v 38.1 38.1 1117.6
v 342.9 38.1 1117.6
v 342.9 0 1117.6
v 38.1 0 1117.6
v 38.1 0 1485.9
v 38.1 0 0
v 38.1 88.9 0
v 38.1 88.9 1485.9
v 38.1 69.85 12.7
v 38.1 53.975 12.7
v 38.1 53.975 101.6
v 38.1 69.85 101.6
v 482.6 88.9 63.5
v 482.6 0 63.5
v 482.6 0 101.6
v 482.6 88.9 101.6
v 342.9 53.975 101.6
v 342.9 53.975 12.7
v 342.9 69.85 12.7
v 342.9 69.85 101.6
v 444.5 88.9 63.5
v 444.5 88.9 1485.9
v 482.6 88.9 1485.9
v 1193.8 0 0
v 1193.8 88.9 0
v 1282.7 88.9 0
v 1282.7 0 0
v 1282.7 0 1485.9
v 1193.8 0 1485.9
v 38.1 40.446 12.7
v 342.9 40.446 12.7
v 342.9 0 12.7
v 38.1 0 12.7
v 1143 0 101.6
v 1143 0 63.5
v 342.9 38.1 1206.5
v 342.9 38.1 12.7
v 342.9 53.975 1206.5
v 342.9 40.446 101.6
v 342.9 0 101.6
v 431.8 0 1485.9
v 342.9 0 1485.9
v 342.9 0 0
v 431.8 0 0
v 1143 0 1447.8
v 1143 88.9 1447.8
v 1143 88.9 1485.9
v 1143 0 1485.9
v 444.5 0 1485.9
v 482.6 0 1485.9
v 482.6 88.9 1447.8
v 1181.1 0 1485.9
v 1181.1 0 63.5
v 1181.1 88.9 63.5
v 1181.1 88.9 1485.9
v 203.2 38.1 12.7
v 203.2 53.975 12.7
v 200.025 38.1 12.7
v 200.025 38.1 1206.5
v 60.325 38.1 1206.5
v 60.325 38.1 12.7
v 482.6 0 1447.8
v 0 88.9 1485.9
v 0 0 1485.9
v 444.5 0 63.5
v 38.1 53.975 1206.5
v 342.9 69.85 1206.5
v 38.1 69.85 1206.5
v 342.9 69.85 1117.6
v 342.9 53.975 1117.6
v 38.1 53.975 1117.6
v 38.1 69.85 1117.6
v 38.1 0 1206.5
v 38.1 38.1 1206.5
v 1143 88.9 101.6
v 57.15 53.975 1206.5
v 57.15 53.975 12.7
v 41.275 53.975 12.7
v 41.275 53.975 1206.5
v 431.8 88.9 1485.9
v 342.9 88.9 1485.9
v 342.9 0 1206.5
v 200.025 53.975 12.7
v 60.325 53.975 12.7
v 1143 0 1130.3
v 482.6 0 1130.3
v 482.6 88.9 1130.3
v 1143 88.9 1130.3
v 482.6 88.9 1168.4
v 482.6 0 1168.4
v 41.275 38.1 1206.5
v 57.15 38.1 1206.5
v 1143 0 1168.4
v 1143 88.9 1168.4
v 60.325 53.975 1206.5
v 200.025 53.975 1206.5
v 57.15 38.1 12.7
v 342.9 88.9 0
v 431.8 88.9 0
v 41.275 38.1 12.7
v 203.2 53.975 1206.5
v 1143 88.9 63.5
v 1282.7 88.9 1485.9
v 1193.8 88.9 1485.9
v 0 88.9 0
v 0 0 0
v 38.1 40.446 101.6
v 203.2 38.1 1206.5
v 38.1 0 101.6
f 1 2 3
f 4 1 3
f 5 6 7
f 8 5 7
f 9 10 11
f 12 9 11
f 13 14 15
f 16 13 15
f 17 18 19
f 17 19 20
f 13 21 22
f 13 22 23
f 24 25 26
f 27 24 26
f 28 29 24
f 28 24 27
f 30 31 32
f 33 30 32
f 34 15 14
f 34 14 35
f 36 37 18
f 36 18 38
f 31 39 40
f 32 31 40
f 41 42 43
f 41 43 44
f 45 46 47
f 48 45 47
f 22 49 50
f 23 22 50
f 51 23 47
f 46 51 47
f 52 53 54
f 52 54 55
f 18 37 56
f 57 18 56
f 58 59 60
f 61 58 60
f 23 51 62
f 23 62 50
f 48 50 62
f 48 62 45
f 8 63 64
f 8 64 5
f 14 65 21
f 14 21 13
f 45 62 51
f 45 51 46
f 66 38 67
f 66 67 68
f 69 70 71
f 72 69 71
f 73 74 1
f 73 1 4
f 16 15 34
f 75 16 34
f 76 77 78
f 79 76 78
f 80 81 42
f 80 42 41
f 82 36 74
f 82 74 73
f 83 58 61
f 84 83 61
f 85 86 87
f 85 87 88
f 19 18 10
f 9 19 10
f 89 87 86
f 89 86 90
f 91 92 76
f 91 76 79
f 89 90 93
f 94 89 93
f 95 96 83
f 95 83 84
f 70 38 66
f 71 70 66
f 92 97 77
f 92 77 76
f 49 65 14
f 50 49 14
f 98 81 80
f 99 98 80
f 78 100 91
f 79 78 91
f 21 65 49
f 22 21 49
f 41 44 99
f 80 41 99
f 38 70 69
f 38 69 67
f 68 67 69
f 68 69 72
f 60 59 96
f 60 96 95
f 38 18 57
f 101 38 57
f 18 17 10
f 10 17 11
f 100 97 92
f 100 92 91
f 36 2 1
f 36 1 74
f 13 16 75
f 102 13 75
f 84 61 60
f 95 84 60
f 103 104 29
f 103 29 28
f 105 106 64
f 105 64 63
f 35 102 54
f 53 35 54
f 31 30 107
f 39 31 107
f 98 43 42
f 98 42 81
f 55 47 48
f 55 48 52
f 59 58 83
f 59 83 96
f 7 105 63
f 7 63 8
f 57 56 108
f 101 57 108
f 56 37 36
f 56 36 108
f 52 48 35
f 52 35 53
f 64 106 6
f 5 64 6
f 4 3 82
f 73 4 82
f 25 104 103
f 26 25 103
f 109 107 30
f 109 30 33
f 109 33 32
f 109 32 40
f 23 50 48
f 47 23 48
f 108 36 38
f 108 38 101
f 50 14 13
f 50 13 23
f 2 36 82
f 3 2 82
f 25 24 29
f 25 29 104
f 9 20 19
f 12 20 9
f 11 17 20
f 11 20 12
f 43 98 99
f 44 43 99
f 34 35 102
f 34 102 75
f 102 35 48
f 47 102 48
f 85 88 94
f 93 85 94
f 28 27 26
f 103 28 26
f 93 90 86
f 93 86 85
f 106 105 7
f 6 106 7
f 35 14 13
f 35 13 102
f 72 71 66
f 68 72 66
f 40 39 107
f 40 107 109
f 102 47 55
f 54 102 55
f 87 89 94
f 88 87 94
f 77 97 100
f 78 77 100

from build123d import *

# Parameters (mm, degrees)
F0_W      = 88.9
F0_H      = 88.9
F1_DEPTH  = 1485.9
F0_W_2    = 38.1
F2_W      = 38.1
F2_H      = 88.9
F3_DEPTH  = 304.8
F2_W_2    = 40.4457002878
F4_W      = 139.7
F4_H      = 1193.8
F5_DEPTH  = 15.875
F4_W_2    = 15.875
F6_W      = 304.8
F6_H      = 88.9
F7_DEPTH  = 15.875
F8_W      = 38.1
F8_H      = 1422.4
F9_DEPTH  = 88.9
F10_W     = 660.4
F10_H     = 38.1
F11_DEPTH = 88.9
F12_W     = 38.1
F12_H     = 38.1
F12_W_2   = 88.9
F13_DEPTH = 88.9


with BuildPart() as f1:
    # F0 (on Top) → F1 (new body)
    with BuildSketch(Plane.XY):
        with Locations((1238.25, 44.45)):
            Rectangle(F0_W, F0_H)
    extrude(amount=F1_DEPTH)

    # F12 (on face) → F13 (cut)
    with BuildSketch(Plane.XZ):
        with Locations((19.05, 1466.85)):
            Rectangle(F12_W, F12_H)
        with Locations((387.35, 1466.85)):
            Rectangle(F12_W_2, F12_H)
    extrude(amount=F13_DEPTH, mode=Mode.SUBTRACT)


with BuildPart() as f1b:
    # F0 (on Top) → F1, piece 2 (new body)
    with BuildSketch(Plane.XY):
        with Locations((387.35, 44.45)):
            Rectangle(F0_W, F0_H)
    extrude(amount=F1_DEPTH)


with BuildPart() as f1c:
    # F0 (on Top) → F1, piece 3 (new body)
    with BuildSketch(Plane.XY):
        with Locations((19.05, 44.45)):
            Rectangle(F0_W_2, F0_H)
    extrude(amount=F1_DEPTH)


with BuildPart() as f3:
    # F2 (on face) → F3 (new body, through all)
    with BuildSketch(Plane(origin=(342.9, 0, 0), x_dir=(0, -1, 0), z_dir=(-1, 0, 0))):
        with Locations((-19.05, 1162.05)):
            Rectangle(F2_W, F2_H)
    extrude(amount=F3_DEPTH)


with BuildPart() as f3b:
    # F2 (on face) → F3, piece 2 (new body, through all)
    with BuildSketch(Plane(origin=(342.9, 0, 0), x_dir=(0, -1, 0), z_dir=(-1, 0, 0))):
        with Locations((-20.2228501439, 57.15)):
            Rectangle(F2_W_2, F2_H)
    extrude(amount=F3_DEPTH)


with BuildPart() as f5:
    # F4 (on face) → F5 (new body)
    with BuildSketch(Plane(origin=(0, 38.1, 0), x_dir=(-1, 0, 0), z_dir=(0, 1, 0))):
        with Locations((-273.05, 609.6)):
            Rectangle(F4_W, F4_H)
    extrude(amount=F5_DEPTH)


with BuildPart() as f5b:
    # F4 (on face) → F5, piece 2 (new body)
    with BuildSketch(Plane(origin=(0, 38.1, 0), x_dir=(-1, 0, 0), z_dir=(0, 1, 0))):
        with Locations((-130.175, 609.6)):
            Rectangle(F4_W, F4_H)
    extrude(amount=F5_DEPTH)


with BuildPart() as f5c:
    # F4 (on face) → F5, piece 3 (new body)
    with BuildSketch(Plane(origin=(0, 38.1, 0), x_dir=(-1, 0, 0), z_dir=(0, 1, 0))):
        with Locations((-49.2125, 609.6)):
            Rectangle(F4_W_2, F4_H)
    extrude(amount=F5_DEPTH)


with BuildPart() as f7:
    # F6 (on face) → F7 (new body)
    with BuildSketch(Plane(origin=(0, 53.975, 0), x_dir=(-1, 0, 0), z_dir=(0, 1, 0))):
        with Locations((-190.5, 1162.05)):
            Rectangle(F6_W, F6_H)
    extrude(amount=F7_DEPTH)


with BuildPart() as f7b:
    # F6 (on face) → F7, piece 2 (new body)
    with BuildSketch(Plane(origin=(0, 53.975, 0), x_dir=(-1, 0, 0), z_dir=(0, 1, 0))):
        with Locations((-190.5, 57.15)):
            Rectangle(F6_W, F6_H)
    extrude(amount=F7_DEPTH)


with BuildPart() as f9:
    # F8 (on face) → F9 (new body)
    with BuildSketch(Plane.XZ):
        with Locations((1162.05, 774.7)):
            Rectangle(F8_W, F8_H)
    extrude(amount=-F9_DEPTH)


with BuildPart() as f9b:
    # F8 (on face) → F9, piece 2 (new body)
    with BuildSketch(Plane.XZ):
        with Locations((463.55, 774.7)):
            Rectangle(F8_W, F8_H)
    extrude(amount=-F9_DEPTH)


with BuildPart() as f11:
    # F10 (on face) → F11 (new body)
    with BuildSketch(Plane.XZ):
        with Locations((812.8, 1466.85)):
            Rectangle(F10_W, F10_H)
    extrude(amount=-F11_DEPTH)


with BuildPart() as f11b:
    # F10 (on face) → F11, piece 2 (new body)
    with BuildSketch(Plane.XZ):
        with Locations((812.8, 1149.35)):
            Rectangle(F10_W, F10_H)
    extrude(amount=-F11_DEPTH)


with BuildPart() as f11c:
    # F10 (on face) → F11, piece 3 (new body)
    with BuildSketch(Plane.XZ):
        with Locations((812.8, 82.55)):
            Rectangle(F10_W, F10_H)
    extrude(amount=-F11_DEPTH)


solid = Compound([f1.part, f1b.part, f1c.part, f3.part, f3b.part, f5.part, f5b.part, f5c.part, f7.part, f7b.part, f9.part, f9b.part, f11.part, f11b.part, f11c.part])
